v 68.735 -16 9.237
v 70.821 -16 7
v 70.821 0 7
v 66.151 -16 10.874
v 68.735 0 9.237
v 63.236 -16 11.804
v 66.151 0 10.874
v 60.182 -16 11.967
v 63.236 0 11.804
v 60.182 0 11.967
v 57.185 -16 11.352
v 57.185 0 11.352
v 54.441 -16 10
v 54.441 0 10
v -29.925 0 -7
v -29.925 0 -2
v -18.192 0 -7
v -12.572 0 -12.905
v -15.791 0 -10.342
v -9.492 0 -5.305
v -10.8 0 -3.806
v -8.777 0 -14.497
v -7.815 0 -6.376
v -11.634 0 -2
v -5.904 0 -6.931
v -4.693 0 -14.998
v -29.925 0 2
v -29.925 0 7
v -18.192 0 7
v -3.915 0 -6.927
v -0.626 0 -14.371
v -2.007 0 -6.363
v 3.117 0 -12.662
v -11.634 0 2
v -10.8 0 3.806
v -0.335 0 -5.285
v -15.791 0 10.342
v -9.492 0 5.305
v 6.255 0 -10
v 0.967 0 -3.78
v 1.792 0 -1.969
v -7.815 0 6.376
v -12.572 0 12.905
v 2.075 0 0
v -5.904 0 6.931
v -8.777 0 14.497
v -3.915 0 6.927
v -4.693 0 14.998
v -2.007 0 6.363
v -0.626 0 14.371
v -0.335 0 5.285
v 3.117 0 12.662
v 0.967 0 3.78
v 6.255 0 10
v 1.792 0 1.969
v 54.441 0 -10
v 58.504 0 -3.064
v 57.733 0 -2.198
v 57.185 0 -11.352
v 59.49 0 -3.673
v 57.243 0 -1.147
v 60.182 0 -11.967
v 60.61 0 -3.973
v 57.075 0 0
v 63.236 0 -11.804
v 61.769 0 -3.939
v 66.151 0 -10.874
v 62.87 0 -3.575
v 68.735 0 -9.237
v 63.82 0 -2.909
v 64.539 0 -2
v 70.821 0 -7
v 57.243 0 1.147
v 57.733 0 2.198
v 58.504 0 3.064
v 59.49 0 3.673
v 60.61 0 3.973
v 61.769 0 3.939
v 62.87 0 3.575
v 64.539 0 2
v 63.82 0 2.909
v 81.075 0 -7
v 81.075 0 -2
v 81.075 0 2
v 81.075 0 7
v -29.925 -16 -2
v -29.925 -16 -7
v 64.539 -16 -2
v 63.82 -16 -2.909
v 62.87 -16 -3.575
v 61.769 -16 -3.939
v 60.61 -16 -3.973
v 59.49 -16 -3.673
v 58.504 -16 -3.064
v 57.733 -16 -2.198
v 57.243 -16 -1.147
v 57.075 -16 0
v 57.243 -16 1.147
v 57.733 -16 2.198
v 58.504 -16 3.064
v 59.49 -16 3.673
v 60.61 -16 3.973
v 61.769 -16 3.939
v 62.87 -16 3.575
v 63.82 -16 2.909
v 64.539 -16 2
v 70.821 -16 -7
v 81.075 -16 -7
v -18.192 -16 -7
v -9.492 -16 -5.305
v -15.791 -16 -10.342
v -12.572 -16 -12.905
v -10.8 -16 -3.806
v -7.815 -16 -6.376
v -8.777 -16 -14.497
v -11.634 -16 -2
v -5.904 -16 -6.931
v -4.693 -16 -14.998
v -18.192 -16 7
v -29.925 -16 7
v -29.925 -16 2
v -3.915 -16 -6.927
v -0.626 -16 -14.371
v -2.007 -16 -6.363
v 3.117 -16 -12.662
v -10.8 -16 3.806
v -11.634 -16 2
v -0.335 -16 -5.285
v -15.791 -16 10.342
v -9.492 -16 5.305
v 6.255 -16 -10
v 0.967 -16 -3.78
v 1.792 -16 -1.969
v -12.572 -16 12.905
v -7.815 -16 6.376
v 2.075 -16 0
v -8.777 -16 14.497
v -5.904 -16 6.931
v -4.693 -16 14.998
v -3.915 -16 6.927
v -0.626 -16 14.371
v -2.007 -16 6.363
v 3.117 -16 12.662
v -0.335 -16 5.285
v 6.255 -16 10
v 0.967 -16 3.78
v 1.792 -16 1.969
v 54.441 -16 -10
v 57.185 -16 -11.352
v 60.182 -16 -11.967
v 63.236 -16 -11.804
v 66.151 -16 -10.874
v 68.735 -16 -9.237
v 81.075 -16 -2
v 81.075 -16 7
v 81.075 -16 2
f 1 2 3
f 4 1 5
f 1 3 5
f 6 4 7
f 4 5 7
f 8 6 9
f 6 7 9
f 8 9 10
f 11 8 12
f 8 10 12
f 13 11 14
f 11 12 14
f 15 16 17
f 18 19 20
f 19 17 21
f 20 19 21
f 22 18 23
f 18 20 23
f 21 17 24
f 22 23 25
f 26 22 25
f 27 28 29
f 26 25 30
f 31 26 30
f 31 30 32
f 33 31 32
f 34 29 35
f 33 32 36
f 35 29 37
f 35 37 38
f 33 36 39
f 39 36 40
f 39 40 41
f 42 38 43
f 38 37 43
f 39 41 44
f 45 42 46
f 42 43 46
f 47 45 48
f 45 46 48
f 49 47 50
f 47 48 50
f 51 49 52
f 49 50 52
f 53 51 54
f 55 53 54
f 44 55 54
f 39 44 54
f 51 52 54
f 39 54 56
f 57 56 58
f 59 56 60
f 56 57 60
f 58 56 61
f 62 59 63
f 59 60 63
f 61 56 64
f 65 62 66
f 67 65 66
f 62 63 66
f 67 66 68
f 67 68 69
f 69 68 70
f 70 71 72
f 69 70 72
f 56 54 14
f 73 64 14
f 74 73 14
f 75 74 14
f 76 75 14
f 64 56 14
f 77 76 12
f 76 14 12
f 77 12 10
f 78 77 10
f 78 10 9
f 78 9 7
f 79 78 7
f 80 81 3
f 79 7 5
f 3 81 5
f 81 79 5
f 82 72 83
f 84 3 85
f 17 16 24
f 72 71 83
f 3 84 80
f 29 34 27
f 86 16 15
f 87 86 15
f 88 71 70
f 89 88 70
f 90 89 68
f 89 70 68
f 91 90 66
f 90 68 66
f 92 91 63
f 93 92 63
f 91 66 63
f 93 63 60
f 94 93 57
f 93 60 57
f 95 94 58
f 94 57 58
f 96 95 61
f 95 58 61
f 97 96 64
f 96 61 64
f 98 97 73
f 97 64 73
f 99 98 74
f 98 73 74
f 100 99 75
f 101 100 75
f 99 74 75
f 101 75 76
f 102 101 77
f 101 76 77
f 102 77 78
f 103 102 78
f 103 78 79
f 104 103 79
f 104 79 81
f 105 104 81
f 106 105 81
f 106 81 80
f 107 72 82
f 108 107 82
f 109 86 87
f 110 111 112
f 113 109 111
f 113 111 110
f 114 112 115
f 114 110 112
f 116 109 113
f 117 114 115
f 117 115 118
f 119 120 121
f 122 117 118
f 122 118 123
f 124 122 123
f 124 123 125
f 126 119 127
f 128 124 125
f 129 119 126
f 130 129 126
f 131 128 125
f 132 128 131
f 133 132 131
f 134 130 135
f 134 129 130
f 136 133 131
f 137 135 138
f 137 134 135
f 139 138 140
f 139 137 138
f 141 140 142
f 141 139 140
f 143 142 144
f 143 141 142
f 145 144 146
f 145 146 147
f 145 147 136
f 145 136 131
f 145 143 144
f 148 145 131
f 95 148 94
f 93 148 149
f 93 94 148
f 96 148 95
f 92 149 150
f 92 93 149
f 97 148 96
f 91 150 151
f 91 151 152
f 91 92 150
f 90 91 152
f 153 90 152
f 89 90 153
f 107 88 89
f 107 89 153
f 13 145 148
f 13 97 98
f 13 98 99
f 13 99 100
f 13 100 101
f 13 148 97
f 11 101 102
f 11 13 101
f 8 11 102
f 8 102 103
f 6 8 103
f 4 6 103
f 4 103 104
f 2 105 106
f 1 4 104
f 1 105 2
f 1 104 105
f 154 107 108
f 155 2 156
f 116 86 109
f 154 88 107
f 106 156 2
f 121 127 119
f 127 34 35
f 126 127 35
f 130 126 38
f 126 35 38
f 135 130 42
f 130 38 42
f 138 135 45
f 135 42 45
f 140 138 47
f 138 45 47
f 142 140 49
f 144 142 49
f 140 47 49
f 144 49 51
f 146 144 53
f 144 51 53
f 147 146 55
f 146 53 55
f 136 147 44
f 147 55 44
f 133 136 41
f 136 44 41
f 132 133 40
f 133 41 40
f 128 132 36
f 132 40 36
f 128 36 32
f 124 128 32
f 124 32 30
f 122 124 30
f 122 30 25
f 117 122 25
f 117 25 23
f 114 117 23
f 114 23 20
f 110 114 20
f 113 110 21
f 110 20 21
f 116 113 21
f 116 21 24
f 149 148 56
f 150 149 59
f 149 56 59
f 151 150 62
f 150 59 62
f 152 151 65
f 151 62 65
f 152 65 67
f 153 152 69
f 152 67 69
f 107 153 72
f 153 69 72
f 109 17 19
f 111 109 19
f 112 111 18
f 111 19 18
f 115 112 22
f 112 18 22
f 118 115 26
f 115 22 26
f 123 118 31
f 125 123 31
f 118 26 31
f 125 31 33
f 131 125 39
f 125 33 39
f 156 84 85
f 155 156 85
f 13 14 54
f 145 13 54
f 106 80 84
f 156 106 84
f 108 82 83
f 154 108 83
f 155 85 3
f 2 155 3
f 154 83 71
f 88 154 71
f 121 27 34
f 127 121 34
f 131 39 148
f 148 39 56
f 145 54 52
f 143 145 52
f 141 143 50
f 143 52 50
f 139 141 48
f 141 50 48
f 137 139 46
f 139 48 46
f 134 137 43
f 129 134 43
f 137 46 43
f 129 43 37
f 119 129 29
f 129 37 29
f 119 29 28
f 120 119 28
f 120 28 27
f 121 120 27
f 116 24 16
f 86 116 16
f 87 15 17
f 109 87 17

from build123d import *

# Parameters (mm, degrees)
F1_DEPTH = 16


with BuildPart() as f1:
    # F0 (on Front) → F1 (new body)
    with BuildSketch(Plane.XZ):
        with BuildLine():
            ThreePointArc((-11.633543, 2), (2.074661, 0), (-11.633543, -2))
            Line((-11.633543, -2), (-19.791408, -2))
            ThreePointArc((-19.791408, -2), (-19.212058, -4.57052), (-18.191838, -7))
            ThreePointArc((-18.191838, -7), (-6.752363, -14.888317), (6.255001, -10))
            ThreePointArc((6.255001, -10), (10.074661, 0), (6.255001, 10))
            ThreePointArc((6.255001, 10), (-6.752363, 14.888317), (-18.191838, 7))
            ThreePointArc((-18.191838, 7), (-19.212058, 4.57052), (-19.791408, 2))
            Line((-19.791408, 2), (-11.633543, 2))
        make_face()
        with BuildLine():
            ThreePointArc((-18.191838, -7), (-19.212058, -4.57052), (-19.791408, -2))
            Line((-19.791408, -2), (-29.925339, -2))
            Line((-29.925339, -2), (-29.925339, -7))
            Line((-29.925339, -7), (-18.191838, -7))
        make_face()
        with BuildLine():
            Line((-29.925339, 2), (-19.791408, 2))
            ThreePointArc((-19.791408, 2), (-19.212058, 4.57052), (-18.191838, 7))
            Line((-18.191838, 7), (-29.925339, 7))
            Line((-29.925339, 7), (-29.925339, 2))
        make_face()
        with BuildLine():
            ThreePointArc((6.255001, 10), (10.074661, 0), (6.255001, -10))
            Line((6.255001, -10), (54.441411, -10))
            ThreePointArc((54.441411, -10), (49.074661, 0), (54.441411, 10))
            Line((54.441411, 10), (6.255001, 10))
        make_face()
        with BuildLine():
            ThreePointArc((54.441411, 10), (49.074661, 0), (54.441411, -10))
            ThreePointArc((54.441411, -10), (63.236498, -11.803663), (70.821455, -7))
            ThreePointArc((70.821455, -7), (72.149986, -4.619219), (72.906821, -2))
            Line((72.906821, -2), (64.538763, -2))
            ThreePointArc((64.538763, -2), (57.074661, 0), (64.538763, 2))
            Line((64.538763, 2), (72.906821, 2))
            ThreePointArc((72.906821, 2), (72.149986, 4.619219), (70.821455, 7))
            ThreePointArc((70.821455, 7), (63.236498, 11.803663), (54.441411, 10))
        make_face()
        with BuildLine():
            ThreePointArc((72.906821, -2), (72.149986, -4.619219), (70.821455, -7))
            Line((70.821455, -7), (81.074661, -7))
            Line((81.074661, -7), (81.074661, -2))
            Line((81.074661, -2), (72.906821, -2))
        make_face()
        with BuildLine():
            Line((81.074661, 7), (70.821455, 7))
            ThreePointArc((70.821455, 7), (72.149986, 4.619219), (72.906821, 2))
            Line((72.906821, 2), (81.074661, 2))
            Line((81.074661, 2), (81.074661, 7))
        make_face()
    extrude(amount=F1_DEPTH)


solid = f1.part
